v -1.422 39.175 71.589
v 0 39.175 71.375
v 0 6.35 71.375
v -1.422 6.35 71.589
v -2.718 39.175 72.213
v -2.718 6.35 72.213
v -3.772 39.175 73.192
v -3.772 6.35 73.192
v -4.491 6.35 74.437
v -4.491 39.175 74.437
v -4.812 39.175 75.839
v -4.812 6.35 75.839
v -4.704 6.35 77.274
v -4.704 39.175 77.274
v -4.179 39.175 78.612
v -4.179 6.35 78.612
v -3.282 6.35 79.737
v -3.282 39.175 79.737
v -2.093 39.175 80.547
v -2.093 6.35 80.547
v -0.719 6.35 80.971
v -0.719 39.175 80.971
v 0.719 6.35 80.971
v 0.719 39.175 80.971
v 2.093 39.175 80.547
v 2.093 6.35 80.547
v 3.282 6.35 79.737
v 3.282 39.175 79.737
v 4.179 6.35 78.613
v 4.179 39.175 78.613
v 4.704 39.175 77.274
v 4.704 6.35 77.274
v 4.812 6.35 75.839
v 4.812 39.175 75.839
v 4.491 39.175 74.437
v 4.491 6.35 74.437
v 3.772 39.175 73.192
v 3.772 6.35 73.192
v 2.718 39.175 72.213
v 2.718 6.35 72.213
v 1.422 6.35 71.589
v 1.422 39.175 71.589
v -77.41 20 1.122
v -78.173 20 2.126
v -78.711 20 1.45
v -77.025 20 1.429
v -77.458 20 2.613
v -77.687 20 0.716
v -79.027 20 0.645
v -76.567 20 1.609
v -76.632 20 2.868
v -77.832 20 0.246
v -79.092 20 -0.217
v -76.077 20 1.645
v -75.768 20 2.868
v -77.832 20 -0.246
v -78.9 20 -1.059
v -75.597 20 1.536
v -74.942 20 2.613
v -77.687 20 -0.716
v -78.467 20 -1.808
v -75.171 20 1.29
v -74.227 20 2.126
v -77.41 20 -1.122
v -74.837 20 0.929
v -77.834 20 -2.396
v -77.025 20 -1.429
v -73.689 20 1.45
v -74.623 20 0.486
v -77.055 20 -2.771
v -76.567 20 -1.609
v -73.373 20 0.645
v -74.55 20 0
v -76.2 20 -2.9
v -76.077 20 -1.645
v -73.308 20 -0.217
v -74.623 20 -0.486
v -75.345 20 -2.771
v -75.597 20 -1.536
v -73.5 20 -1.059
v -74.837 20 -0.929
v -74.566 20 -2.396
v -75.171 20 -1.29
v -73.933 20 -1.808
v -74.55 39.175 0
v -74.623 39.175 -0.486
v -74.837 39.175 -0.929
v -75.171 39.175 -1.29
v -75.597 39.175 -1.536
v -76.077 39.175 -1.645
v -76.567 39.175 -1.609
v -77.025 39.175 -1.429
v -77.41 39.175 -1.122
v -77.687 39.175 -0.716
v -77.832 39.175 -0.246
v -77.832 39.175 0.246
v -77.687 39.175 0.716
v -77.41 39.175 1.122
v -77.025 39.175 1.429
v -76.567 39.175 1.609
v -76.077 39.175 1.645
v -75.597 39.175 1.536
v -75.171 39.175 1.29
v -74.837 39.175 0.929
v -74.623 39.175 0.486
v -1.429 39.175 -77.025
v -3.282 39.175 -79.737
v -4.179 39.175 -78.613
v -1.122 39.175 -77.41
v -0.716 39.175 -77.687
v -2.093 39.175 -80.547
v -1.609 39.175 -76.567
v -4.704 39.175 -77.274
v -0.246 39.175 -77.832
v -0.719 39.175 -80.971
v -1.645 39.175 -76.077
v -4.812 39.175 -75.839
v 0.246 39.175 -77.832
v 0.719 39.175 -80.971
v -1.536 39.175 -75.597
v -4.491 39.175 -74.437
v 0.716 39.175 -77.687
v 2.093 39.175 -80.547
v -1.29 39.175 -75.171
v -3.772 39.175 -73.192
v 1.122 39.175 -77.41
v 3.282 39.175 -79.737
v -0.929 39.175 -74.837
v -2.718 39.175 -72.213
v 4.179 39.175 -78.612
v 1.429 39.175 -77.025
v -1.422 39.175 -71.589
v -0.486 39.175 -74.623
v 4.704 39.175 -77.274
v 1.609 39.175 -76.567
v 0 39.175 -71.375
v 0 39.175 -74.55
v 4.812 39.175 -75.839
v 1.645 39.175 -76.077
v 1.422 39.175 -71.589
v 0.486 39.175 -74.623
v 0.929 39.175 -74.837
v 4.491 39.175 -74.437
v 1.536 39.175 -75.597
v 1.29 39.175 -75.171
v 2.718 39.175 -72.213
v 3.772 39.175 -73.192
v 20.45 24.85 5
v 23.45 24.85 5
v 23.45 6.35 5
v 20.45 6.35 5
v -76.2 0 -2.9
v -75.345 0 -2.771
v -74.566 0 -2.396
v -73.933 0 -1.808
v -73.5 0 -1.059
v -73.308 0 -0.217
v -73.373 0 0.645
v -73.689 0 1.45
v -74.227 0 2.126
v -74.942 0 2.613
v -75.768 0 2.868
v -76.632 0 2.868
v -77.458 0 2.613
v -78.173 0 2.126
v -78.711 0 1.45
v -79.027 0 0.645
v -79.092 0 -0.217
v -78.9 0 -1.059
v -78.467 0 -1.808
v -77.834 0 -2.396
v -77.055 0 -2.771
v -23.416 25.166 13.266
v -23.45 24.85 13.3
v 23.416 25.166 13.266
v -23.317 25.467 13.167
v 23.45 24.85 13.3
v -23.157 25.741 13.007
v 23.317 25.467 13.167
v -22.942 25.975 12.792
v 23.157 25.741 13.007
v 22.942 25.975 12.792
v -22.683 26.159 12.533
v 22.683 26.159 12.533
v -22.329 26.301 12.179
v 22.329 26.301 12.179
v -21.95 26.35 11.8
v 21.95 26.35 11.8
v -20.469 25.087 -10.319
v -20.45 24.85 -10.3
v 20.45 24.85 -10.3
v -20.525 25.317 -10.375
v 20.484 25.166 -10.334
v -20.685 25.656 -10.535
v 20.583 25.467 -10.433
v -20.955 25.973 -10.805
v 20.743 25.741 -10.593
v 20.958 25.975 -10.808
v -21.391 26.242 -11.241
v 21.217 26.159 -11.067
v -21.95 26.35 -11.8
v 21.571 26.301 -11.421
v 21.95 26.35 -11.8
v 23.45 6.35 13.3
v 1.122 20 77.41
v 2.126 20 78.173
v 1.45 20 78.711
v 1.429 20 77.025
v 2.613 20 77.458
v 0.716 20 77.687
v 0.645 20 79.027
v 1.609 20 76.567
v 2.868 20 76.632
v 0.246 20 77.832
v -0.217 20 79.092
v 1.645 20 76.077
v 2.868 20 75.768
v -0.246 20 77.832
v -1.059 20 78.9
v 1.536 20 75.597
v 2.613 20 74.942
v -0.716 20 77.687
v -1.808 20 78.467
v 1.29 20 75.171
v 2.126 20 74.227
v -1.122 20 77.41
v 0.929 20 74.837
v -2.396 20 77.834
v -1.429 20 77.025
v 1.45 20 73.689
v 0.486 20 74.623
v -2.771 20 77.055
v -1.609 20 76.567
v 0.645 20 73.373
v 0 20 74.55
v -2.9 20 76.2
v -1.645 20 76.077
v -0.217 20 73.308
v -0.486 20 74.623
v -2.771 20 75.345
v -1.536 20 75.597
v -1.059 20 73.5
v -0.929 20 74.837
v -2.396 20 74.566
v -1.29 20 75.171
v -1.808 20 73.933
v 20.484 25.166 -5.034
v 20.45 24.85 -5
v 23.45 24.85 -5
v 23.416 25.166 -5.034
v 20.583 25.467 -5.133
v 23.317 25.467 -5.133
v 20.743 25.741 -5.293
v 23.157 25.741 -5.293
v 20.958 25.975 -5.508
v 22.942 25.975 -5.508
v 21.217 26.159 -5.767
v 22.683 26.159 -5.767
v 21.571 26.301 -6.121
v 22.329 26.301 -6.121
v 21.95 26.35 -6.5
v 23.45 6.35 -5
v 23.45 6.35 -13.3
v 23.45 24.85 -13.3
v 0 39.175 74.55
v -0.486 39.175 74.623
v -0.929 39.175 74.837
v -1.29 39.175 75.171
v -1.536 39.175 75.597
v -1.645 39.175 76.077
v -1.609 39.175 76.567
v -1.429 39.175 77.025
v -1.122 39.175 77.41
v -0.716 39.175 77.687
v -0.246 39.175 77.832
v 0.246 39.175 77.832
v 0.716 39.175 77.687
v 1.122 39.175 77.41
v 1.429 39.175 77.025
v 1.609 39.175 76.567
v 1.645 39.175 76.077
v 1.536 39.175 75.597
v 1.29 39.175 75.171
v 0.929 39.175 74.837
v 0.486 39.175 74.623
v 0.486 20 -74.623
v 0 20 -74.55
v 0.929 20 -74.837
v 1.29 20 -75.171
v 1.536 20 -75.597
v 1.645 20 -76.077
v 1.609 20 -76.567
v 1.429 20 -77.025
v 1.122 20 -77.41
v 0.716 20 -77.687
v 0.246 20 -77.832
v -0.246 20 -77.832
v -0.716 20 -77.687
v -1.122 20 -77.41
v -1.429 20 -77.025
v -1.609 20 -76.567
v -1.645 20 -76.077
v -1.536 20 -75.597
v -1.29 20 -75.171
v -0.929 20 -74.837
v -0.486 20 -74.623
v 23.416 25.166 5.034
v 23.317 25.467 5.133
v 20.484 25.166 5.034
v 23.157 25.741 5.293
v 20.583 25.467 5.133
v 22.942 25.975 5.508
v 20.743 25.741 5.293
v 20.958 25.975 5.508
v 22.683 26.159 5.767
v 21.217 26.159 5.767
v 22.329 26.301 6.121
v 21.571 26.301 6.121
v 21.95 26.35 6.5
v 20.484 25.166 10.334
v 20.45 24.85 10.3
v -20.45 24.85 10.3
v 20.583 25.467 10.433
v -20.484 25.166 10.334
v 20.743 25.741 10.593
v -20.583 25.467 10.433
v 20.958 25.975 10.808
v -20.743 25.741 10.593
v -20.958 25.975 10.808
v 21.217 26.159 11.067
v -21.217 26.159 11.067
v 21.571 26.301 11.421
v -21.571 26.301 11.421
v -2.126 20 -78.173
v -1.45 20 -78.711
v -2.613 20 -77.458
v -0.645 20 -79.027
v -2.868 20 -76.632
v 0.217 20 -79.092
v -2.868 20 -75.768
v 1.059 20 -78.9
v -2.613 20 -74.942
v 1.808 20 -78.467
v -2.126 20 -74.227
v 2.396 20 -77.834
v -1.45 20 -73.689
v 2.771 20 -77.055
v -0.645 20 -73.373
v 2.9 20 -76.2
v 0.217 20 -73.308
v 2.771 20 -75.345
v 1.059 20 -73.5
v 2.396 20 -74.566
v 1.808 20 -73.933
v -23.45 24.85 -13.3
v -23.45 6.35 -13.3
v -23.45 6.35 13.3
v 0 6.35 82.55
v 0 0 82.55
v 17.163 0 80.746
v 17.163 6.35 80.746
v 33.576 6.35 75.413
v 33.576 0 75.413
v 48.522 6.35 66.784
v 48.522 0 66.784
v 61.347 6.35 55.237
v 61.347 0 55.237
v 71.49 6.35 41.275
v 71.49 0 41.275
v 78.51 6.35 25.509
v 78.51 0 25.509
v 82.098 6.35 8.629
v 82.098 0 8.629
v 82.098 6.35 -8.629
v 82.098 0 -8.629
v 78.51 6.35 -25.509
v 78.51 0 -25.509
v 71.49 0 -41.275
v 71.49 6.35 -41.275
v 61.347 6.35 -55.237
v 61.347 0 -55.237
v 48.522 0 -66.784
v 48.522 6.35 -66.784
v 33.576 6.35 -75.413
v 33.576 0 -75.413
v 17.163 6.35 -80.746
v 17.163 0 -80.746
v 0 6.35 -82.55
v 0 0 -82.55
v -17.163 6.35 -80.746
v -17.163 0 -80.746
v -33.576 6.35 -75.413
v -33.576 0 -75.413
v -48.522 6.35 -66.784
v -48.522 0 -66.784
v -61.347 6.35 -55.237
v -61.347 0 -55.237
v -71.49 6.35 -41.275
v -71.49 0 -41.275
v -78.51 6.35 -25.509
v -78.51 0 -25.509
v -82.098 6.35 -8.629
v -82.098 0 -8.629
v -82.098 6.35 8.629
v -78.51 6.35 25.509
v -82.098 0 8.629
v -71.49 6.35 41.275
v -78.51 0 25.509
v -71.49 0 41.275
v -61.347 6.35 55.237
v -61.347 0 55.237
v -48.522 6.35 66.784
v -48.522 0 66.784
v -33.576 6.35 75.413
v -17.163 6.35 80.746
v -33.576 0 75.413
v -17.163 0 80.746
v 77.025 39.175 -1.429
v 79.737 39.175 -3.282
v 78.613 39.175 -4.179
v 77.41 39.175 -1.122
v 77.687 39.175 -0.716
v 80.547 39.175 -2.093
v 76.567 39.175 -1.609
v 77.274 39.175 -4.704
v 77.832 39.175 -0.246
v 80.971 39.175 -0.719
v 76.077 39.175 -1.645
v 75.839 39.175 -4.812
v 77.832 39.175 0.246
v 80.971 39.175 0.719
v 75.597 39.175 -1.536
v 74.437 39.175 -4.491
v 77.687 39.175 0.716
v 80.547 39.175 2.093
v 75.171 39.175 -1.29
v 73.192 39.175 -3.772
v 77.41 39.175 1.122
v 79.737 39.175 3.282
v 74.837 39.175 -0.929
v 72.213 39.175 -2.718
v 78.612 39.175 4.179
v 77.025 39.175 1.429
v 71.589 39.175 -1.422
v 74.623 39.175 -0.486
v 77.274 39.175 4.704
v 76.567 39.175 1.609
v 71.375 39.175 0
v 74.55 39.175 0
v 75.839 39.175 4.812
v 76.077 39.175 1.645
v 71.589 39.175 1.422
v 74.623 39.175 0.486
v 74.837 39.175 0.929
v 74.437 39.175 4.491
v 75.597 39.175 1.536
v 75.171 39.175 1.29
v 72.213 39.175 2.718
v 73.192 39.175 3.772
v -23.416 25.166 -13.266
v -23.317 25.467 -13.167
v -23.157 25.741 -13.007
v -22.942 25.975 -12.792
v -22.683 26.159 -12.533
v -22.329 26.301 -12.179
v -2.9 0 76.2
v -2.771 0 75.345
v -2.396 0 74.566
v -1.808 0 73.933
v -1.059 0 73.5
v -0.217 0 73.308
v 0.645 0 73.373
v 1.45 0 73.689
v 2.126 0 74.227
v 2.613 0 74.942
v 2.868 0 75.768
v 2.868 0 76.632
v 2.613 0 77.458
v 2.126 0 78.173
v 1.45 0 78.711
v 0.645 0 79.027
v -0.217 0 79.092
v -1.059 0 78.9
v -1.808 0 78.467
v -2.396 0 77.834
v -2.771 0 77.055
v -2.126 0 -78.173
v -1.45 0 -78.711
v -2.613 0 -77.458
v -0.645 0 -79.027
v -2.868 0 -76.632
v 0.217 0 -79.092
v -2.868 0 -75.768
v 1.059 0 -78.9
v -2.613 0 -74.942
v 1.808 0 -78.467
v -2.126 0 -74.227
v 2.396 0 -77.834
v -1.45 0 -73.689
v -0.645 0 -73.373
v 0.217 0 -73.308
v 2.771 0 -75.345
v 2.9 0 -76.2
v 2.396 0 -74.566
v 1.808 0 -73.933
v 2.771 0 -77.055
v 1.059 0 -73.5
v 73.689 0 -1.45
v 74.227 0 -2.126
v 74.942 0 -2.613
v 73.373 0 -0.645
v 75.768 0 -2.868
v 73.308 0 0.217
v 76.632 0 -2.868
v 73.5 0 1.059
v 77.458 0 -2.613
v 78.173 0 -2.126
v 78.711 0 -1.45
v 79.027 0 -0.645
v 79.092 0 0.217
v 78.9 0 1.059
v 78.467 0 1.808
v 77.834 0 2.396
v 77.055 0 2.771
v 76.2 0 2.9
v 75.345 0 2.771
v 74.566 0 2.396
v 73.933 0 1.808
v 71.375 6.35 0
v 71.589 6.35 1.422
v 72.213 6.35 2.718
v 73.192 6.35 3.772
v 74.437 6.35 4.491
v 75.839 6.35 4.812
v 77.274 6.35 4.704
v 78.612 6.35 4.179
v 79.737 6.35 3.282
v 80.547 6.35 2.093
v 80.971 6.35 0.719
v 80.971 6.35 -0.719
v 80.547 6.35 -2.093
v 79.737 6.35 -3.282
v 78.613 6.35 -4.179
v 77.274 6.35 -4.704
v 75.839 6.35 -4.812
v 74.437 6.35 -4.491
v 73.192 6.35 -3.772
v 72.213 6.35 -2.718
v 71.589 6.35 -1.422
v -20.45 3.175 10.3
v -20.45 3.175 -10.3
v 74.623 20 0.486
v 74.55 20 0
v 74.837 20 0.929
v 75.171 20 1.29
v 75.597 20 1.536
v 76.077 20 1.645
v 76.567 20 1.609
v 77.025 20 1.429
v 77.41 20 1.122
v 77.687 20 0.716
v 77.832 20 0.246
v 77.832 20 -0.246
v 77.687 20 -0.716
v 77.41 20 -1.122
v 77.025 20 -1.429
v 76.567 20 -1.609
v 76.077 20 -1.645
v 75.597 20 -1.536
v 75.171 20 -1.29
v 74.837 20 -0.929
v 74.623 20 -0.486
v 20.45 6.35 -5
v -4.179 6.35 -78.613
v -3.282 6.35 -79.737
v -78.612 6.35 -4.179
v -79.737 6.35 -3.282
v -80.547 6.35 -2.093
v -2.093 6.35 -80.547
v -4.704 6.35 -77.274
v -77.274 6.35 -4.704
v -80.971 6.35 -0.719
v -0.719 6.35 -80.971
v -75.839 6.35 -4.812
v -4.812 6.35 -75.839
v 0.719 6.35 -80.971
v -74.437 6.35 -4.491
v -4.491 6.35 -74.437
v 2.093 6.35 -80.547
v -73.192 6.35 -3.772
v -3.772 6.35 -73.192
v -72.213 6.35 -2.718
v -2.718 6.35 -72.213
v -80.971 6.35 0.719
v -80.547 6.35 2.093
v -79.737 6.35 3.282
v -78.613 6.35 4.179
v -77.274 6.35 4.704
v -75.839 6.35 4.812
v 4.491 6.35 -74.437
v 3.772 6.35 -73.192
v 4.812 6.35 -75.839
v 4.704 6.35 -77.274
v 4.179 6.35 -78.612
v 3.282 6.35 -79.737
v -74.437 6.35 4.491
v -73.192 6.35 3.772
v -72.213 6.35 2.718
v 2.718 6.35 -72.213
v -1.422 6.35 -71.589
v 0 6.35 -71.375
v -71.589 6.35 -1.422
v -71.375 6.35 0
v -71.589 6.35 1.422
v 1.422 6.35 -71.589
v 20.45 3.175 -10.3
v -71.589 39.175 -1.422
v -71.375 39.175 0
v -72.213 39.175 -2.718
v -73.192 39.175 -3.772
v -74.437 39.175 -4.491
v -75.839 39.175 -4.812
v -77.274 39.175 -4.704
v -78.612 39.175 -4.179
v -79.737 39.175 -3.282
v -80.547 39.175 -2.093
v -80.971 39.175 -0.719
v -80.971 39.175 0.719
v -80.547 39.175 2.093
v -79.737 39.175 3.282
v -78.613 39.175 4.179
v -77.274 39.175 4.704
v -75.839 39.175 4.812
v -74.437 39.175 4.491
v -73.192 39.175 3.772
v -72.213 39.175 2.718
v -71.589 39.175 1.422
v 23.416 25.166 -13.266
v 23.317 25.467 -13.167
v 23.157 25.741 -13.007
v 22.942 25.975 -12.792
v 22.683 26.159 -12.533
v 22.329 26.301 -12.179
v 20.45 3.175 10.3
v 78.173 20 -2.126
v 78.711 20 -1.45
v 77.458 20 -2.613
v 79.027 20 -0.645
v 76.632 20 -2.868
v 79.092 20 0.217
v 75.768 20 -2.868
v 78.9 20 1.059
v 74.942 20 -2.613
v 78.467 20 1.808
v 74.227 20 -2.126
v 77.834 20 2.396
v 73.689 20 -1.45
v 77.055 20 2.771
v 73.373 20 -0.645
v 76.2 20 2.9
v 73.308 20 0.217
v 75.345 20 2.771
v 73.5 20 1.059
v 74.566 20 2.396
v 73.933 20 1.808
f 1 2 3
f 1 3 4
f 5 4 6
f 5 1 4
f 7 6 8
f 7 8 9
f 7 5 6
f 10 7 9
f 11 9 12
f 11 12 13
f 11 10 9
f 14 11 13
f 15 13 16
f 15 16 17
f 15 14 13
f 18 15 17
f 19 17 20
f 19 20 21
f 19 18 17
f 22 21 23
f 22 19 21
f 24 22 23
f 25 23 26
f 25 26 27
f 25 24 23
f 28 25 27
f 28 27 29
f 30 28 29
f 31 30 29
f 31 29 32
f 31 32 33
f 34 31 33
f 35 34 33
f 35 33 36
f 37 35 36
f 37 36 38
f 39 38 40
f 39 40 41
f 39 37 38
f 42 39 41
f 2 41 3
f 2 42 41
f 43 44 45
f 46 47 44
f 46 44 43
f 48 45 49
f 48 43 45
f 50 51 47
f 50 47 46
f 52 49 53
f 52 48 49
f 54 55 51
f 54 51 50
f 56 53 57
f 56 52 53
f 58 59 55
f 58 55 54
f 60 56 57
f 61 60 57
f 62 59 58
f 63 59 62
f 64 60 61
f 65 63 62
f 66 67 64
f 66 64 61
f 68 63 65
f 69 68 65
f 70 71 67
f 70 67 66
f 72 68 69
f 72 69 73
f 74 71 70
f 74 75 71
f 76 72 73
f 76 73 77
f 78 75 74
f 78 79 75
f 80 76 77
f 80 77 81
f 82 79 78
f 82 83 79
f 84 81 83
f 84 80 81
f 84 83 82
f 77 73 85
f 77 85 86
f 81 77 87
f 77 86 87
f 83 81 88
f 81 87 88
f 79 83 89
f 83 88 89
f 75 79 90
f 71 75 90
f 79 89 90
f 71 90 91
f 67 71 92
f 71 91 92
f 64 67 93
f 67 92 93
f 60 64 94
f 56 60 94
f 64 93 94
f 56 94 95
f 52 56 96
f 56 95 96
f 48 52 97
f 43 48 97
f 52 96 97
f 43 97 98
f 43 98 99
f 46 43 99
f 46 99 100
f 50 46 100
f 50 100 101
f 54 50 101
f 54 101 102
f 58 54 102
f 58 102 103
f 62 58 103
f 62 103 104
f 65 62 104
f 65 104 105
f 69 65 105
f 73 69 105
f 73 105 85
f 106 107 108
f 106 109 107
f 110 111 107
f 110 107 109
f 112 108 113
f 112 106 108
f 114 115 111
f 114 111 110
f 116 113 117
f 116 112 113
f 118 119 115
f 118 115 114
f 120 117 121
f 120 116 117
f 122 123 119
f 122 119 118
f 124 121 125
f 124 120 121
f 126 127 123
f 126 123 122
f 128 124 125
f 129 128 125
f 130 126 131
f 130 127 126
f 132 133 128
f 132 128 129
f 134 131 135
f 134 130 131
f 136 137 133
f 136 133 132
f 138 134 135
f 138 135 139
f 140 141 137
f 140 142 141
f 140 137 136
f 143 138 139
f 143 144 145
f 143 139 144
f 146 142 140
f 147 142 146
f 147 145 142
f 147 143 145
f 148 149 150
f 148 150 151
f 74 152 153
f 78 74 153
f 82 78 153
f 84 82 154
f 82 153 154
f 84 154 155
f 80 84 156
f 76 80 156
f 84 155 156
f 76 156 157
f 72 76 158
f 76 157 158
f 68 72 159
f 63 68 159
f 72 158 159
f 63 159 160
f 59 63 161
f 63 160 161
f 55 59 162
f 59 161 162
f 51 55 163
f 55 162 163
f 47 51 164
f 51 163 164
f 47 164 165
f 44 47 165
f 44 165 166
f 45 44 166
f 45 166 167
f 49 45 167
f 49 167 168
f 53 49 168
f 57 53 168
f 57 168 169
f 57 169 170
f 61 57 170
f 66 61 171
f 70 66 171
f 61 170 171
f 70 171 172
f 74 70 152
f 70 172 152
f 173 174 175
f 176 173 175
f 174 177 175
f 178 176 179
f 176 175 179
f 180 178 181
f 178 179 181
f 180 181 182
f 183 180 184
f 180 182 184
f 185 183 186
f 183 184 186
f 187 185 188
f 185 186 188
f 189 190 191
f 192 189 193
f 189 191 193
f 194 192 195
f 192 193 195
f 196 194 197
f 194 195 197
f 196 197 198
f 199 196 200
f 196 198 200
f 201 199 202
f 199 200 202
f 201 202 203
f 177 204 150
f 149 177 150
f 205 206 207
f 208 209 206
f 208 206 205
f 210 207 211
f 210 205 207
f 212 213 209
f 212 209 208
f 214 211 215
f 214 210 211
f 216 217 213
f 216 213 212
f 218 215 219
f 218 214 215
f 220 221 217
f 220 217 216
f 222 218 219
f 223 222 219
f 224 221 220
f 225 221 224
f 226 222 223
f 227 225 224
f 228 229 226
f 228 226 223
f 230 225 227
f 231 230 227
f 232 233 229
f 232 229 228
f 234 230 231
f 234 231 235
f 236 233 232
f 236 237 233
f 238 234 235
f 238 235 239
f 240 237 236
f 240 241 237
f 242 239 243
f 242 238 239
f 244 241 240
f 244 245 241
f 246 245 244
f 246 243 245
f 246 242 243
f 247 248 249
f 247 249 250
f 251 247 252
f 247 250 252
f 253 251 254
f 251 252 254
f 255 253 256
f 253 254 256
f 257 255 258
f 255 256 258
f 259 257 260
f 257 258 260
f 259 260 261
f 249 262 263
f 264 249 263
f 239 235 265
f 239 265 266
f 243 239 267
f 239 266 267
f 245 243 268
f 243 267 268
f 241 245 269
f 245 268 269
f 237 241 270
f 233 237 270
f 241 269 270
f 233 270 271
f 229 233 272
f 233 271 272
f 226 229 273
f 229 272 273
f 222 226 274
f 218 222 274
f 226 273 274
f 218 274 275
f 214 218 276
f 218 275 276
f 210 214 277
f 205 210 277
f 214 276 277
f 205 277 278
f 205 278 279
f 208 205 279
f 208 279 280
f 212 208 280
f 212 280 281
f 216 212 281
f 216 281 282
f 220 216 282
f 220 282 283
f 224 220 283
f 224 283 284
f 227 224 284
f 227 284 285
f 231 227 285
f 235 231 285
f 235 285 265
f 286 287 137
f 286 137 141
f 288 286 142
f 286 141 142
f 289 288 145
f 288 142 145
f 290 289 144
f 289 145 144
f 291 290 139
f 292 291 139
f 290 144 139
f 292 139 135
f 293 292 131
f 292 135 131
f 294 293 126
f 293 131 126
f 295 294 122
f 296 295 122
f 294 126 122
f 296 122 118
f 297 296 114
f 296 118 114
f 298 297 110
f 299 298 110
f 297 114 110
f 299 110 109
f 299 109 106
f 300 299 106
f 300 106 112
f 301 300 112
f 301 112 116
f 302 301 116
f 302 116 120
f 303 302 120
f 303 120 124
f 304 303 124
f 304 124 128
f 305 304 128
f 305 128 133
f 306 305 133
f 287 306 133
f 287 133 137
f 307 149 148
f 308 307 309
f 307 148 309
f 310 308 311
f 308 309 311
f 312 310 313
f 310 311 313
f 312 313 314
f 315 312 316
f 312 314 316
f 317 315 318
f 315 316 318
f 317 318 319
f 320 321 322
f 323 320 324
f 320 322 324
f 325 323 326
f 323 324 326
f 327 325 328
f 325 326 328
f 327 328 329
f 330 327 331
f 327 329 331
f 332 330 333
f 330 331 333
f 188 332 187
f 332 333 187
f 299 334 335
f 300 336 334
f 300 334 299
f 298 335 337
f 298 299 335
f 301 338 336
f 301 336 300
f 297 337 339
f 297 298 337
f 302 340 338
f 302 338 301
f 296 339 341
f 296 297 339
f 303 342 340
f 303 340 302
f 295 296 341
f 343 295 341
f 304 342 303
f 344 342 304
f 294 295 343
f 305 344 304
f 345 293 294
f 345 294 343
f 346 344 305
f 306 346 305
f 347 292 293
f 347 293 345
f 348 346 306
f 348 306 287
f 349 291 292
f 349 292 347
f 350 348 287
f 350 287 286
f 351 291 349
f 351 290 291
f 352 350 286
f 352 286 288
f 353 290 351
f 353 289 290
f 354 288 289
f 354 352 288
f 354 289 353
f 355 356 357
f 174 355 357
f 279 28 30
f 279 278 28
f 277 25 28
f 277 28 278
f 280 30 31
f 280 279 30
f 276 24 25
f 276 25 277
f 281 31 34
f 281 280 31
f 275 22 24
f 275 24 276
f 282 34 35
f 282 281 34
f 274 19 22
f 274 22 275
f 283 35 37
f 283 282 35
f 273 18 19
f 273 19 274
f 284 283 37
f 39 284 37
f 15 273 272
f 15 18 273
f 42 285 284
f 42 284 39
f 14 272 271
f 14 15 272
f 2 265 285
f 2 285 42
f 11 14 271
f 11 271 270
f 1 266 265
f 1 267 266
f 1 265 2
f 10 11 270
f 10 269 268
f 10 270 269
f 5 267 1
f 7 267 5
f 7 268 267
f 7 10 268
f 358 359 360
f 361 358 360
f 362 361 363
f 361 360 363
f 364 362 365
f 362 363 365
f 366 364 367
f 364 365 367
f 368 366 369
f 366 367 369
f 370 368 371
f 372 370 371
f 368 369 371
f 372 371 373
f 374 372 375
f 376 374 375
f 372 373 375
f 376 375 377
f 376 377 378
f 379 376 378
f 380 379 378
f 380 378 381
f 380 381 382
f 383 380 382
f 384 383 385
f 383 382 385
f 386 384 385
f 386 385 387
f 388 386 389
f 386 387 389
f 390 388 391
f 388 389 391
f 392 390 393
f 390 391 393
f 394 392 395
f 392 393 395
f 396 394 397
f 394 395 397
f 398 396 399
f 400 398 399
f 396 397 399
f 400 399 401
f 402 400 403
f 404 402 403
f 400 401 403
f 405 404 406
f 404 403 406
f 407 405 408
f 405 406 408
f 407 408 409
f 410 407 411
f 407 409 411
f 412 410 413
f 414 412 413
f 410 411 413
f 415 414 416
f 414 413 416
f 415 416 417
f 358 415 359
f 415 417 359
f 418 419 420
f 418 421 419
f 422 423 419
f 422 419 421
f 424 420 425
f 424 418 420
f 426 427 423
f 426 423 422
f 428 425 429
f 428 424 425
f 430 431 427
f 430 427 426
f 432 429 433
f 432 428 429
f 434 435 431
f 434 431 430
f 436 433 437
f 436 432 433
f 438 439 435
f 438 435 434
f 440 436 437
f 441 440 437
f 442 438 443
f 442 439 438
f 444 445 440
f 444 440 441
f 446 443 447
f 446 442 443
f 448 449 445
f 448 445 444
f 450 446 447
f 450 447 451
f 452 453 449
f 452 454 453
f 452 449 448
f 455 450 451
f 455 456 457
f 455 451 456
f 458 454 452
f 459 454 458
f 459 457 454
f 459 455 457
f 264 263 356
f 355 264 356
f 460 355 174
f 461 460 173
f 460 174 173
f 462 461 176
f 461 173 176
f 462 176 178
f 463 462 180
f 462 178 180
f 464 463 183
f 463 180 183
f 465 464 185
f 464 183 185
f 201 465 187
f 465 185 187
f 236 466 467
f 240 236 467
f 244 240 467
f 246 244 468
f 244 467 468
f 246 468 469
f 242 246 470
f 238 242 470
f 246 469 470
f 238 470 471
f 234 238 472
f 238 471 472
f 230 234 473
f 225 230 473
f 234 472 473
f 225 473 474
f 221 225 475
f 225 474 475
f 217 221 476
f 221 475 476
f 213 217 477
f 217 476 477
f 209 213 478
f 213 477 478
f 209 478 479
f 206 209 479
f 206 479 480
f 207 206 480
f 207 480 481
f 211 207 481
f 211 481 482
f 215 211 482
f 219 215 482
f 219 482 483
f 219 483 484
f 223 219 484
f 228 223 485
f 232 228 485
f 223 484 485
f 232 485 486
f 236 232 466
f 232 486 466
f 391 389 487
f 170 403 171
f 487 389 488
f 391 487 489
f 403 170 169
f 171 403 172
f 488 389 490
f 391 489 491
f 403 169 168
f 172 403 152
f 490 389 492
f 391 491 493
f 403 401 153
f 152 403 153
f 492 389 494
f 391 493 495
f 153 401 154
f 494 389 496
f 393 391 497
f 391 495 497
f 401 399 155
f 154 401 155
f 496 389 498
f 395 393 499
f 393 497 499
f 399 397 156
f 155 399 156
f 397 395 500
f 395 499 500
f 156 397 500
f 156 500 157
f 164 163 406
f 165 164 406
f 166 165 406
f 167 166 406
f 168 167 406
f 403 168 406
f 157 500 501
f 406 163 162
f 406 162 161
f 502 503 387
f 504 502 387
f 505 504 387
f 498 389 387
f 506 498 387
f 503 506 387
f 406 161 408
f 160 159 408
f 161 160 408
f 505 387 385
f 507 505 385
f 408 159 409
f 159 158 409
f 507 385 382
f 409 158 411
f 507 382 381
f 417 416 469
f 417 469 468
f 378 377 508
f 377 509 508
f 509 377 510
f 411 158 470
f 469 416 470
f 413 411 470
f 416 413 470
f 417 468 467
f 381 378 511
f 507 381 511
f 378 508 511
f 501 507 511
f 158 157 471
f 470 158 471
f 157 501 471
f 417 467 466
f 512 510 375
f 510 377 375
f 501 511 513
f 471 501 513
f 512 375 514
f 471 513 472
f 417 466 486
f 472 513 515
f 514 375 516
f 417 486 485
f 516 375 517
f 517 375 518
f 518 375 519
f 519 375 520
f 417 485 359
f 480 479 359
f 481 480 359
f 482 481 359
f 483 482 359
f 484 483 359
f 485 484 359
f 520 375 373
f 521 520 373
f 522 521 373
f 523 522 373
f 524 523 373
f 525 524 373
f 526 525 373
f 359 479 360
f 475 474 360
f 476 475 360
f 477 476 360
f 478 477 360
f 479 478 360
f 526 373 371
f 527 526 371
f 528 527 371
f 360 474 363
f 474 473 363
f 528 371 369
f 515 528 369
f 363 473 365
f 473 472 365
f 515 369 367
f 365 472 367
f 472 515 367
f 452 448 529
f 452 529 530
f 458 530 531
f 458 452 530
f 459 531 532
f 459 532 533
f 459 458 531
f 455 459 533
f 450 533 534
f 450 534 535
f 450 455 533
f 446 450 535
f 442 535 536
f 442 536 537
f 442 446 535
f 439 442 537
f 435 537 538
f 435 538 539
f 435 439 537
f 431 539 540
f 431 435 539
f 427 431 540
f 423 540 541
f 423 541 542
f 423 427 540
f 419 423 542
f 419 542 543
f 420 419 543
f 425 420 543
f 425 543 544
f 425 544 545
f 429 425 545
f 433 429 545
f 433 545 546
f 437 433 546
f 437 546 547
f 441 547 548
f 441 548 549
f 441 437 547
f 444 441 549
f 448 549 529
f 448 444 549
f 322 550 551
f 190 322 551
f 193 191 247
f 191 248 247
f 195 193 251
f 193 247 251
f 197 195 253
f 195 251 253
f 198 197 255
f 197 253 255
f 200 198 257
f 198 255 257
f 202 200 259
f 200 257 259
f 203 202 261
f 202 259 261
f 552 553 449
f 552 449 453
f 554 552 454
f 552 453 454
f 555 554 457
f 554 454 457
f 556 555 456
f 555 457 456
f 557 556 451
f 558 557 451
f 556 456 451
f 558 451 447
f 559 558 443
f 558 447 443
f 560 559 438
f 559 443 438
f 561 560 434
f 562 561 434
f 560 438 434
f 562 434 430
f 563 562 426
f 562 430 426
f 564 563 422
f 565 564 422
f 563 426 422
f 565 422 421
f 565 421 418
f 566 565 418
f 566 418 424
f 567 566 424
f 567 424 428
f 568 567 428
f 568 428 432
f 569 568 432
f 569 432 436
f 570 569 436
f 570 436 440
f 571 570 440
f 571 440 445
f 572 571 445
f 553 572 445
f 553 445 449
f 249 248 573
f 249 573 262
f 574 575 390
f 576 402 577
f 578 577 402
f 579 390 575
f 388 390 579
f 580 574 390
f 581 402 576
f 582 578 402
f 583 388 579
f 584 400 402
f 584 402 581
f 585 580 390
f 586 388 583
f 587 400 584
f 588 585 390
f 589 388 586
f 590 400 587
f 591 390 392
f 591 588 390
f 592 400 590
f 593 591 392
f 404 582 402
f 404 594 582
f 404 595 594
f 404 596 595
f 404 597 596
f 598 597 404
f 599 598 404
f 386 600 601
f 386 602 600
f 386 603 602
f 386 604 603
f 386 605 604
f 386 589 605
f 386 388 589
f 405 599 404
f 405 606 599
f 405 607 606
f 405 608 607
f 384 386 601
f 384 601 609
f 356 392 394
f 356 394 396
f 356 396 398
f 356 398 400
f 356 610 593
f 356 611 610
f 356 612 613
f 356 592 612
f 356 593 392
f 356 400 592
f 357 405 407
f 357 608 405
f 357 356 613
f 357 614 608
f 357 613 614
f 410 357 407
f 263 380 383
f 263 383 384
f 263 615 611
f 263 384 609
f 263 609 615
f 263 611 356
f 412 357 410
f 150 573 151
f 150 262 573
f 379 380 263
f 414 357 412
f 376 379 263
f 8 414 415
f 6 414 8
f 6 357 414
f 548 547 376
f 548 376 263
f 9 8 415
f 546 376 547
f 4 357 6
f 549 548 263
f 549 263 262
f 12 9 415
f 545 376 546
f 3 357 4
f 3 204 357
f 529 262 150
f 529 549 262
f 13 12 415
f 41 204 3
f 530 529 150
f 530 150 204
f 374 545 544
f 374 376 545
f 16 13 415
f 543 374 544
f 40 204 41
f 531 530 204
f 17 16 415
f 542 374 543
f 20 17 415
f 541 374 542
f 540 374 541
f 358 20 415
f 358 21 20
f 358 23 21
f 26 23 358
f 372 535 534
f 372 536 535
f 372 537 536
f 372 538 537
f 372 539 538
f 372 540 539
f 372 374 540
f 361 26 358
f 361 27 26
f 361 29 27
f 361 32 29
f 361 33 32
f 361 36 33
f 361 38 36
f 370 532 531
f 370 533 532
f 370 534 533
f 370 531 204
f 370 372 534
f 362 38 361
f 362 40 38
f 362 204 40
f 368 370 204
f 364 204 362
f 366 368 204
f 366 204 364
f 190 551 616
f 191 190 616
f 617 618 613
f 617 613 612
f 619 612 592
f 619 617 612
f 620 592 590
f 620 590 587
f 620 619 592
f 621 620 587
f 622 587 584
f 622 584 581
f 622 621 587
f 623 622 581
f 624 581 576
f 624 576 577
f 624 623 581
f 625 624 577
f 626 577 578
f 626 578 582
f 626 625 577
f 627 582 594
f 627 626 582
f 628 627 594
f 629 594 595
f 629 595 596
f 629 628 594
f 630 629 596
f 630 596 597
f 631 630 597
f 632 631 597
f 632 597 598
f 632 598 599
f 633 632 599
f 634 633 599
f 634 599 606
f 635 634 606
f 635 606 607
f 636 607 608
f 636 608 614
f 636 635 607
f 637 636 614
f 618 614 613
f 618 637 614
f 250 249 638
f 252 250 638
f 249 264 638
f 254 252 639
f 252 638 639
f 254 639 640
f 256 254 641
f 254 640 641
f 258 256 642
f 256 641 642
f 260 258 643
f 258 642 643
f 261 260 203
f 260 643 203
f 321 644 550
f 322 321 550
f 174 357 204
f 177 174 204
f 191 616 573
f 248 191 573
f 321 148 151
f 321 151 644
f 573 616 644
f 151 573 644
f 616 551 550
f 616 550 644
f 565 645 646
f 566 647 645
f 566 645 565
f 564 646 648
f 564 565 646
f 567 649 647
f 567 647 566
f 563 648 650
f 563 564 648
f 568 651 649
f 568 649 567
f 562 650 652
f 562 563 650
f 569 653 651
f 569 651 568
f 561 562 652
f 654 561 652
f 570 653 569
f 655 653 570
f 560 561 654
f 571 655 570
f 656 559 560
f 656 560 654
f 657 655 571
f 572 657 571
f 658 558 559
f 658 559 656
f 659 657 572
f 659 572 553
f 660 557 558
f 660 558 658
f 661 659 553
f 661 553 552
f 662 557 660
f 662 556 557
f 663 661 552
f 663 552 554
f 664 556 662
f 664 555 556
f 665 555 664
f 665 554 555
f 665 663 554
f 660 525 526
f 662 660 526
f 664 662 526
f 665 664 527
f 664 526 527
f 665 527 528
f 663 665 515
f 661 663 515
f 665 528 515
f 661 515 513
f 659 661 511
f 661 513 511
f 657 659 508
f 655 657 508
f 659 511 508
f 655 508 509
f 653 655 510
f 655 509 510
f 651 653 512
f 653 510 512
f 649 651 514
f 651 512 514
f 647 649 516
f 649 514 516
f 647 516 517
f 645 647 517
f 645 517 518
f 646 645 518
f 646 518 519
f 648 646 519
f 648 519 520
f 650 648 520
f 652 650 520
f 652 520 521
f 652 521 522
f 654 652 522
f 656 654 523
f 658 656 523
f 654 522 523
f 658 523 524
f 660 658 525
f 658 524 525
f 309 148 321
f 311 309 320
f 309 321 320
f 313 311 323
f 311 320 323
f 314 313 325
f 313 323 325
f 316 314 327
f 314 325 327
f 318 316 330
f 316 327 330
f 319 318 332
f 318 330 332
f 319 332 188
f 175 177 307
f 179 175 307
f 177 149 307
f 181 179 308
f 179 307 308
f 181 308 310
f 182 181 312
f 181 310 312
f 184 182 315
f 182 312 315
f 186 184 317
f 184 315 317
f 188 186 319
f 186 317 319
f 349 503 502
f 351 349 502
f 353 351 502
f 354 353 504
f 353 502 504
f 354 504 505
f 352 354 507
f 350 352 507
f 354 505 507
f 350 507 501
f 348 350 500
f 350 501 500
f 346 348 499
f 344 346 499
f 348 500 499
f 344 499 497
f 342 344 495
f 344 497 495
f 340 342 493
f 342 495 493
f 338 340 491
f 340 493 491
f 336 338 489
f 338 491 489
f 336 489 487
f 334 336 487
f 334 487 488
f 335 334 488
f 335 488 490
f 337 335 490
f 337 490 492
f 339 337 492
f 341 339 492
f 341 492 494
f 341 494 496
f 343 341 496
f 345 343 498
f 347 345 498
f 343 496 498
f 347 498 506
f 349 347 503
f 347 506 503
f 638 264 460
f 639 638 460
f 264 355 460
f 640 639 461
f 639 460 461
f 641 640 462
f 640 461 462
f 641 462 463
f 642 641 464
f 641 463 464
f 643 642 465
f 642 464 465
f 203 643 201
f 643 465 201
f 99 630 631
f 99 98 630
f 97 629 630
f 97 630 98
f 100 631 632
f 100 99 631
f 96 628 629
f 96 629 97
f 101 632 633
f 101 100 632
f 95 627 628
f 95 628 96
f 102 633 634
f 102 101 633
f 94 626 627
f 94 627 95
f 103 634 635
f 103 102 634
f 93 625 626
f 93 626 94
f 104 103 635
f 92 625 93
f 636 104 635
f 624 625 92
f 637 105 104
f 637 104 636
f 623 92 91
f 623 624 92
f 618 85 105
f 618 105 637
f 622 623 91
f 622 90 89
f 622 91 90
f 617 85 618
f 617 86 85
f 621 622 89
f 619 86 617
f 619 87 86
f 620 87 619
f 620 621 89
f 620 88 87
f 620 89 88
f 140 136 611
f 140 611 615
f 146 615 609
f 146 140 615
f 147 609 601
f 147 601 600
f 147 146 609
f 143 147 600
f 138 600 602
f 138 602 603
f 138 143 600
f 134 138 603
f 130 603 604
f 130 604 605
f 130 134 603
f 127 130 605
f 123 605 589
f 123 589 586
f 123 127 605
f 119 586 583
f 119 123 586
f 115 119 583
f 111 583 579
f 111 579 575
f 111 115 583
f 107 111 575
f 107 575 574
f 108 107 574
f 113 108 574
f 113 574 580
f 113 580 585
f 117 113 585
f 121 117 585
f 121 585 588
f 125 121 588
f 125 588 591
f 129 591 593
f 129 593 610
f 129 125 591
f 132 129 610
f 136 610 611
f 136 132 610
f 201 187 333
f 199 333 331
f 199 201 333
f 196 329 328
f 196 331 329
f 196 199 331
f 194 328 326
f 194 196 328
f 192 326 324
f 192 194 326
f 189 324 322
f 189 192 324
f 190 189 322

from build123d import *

# Parameters (mm, degrees)
SKETCH1_R           = 82.55
BOSS_EXTRUDE2_DEPTH = 6.35
SKETCH2_W           = 40.9
SKETCH2_H           = 20.6
CUT_EXTRUDE1_DEPTH  = 3.175
CUT_EXTRUDE2_REACH  = 118.916
SKETCH3_R           = 1.65
CIRPATTERN1_COUNT   = 4
BOSS_EXTRUDE3_START = 32.824999914
SKETCH5_R           = 4.825
SKETCH5_R_2         = 1.65
BOSS_EXTRUDE3_DEPTH = 32.824999914
CIRPATTERN3_COUNT   = 4
SKETCH4_R           = 2.9
CUT_EXTRUDE3_DEPTH  = 20
CIRPATTERN4_COUNT   = 4
BOSS_EXTRUDE5_DEPTH = 20
FILLET1_R           = 1.5


with BuildPart() as part:
    # Sketch1 → Boss-Extrude2 (new body)
    with BuildSketch(Plane(origin=(0, 0, 0), x_dir=(1, 0, 0), z_dir=(0, 1, 0))):
        with Locations(Location((0, 0, 0), (0, 0, 270))):
            Circle(SKETCH1_R)
    extrude(amount=BOSS_EXTRUDE2_DEPTH)

    # Sketch2 → Cut-Extrude1 (cut)
    with BuildSketch(Plane(origin=(0, 6.35, 0), x_dir=(1, 0, 0), z_dir=(0, 1, 0))):
        Rectangle(SKETCH2_W, SKETCH2_H)
    extrude(amount=-CUT_EXTRUDE1_DEPTH, mode=Mode.SUBTRACT)

    # Sketch3 → Cut-Extrude2 (cut, up to next)
    with BuildSketch(Plane(origin=(0, 6.35, 0), x_dir=(1, 0, 0), z_dir=(0, 1, 0)), mode=Mode.PRIVATE) as cut_extrude2_sk1:
        with Locations(Location((0, 76.2, 0), (0, 0, 270))):
            Circle(SKETCH3_R)
    cut_extrude2_tool1 = extrude(cut_extrude2_sk1.sketch, amount=-CUT_EXTRUDE2_REACH, mode=Mode.PRIVATE) & part.part
    cut_extrude2 = cut_extrude2_tool1.solids().sort_by_distance((0, 6.35, -76.2))[0]
    add(cut_extrude2, mode=Mode.SUBTRACT)

    # CirPattern1: Cut-Extrude2 ×4 about axis
    cirpattern1_axis = Axis((0, 0, 0), (0, 1, 0))
    for i in range(1, CIRPATTERN1_COUNT):
        add(cut_extrude2.rotate(cirpattern1_axis, i * 360 / CIRPATTERN1_COUNT), mode=Mode.SUBTRACT)

    # Sketch5 → Boss-Extrude3 (add)
    with BuildSketch(Plane(origin=(0, 6.35, 0), x_dir=(1, 0, 0), z_dir=(0, 1, 0)).offset(BOSS_EXTRUDE3_START)):
        with Locations(Location((0, 76.2, 0), (0, 0, 270))):
            Circle(SKETCH5_R)
        with Locations(Location((0, 76.2, 0), (0, 0, 270))):
            Circle(SKETCH5_R_2, mode=Mode.SUBTRACT)
    boss_extrude3 = extrude(amount=-BOSS_EXTRUDE3_DEPTH)

    # CirPattern3: Boss-Extrude3 ×4 about axis
    cirpattern3_axis = Axis((0, 0, 0), (0, 1, 0))
    for i in range(1, CIRPATTERN3_COUNT):
        add(boss_extrude3.rotate(cirpattern3_axis, i * 360 / CIRPATTERN3_COUNT))

    # Sketch4 → Cut-Extrude3 (cut)
    with BuildSketch(Plane.XZ):
        with Locations(Location((-76.2, 0, 0), (0, 0, 270))):
            Circle(SKETCH4_R)
    cut_extrude3 = extrude(amount=-CUT_EXTRUDE3_DEPTH, mode=Mode.SUBTRACT)

    # CirPattern4: Cut-Extrude3 ×4 about axis
    cirpattern4_axis = Axis((0, 0, 0), (0, 1, 0))
    for i in range(1, CIRPATTERN4_COUNT):
        add(cut_extrude3.rotate(cirpattern4_axis, i * 360 / CIRPATTERN4_COUNT), mode=Mode.SUBTRACT)

    # Sketch6 → Boss-Extrude5 (add)
    with BuildSketch(Plane(origin=(0, 6.35, 0), x_dir=(1, 0, 0), z_dir=(0, 1, 0))):
        Polygon((-20.45, 10.3), (20.45, 10.3), (20.45, 5), (23.45, 5), (23.45, 13.3), (-23.45, 13.3), (-23.45, -13.3), (23.45, -13.3), (23.45, -5), (20.45, -5), (20.45, -10.3), (-20.45, -10.3), align=None)
    extrude(amount=BOSS_EXTRUDE5_DEPTH)

    # Fillet1
    fillet1_edges = [part.edges().sort_by_distance(p)[0] for p in [
        (23.45, 26.35, -9.15),
        (0, 26.35, -13.3),
        (-23.45, 26.35, 0),
        (0, 26.35, 13.3),
        (23.45, 26.35, 9.15),
        (21.95, 26.35, 5),
        (20.45, 26.35, 7.65),
        (0, 26.35, 10.3),
        (-20.45, 26.35, 0),
        (0, 26.35, -10.3),
        (20.45, 26.35, -7.65),
        (21.95, 26.35, -5),
    ]]
    fillet(fillet1_edges, radius=FILLET1_R - 0.0001)  # a hair under: the kernel refuses the full size


solid = part.part
